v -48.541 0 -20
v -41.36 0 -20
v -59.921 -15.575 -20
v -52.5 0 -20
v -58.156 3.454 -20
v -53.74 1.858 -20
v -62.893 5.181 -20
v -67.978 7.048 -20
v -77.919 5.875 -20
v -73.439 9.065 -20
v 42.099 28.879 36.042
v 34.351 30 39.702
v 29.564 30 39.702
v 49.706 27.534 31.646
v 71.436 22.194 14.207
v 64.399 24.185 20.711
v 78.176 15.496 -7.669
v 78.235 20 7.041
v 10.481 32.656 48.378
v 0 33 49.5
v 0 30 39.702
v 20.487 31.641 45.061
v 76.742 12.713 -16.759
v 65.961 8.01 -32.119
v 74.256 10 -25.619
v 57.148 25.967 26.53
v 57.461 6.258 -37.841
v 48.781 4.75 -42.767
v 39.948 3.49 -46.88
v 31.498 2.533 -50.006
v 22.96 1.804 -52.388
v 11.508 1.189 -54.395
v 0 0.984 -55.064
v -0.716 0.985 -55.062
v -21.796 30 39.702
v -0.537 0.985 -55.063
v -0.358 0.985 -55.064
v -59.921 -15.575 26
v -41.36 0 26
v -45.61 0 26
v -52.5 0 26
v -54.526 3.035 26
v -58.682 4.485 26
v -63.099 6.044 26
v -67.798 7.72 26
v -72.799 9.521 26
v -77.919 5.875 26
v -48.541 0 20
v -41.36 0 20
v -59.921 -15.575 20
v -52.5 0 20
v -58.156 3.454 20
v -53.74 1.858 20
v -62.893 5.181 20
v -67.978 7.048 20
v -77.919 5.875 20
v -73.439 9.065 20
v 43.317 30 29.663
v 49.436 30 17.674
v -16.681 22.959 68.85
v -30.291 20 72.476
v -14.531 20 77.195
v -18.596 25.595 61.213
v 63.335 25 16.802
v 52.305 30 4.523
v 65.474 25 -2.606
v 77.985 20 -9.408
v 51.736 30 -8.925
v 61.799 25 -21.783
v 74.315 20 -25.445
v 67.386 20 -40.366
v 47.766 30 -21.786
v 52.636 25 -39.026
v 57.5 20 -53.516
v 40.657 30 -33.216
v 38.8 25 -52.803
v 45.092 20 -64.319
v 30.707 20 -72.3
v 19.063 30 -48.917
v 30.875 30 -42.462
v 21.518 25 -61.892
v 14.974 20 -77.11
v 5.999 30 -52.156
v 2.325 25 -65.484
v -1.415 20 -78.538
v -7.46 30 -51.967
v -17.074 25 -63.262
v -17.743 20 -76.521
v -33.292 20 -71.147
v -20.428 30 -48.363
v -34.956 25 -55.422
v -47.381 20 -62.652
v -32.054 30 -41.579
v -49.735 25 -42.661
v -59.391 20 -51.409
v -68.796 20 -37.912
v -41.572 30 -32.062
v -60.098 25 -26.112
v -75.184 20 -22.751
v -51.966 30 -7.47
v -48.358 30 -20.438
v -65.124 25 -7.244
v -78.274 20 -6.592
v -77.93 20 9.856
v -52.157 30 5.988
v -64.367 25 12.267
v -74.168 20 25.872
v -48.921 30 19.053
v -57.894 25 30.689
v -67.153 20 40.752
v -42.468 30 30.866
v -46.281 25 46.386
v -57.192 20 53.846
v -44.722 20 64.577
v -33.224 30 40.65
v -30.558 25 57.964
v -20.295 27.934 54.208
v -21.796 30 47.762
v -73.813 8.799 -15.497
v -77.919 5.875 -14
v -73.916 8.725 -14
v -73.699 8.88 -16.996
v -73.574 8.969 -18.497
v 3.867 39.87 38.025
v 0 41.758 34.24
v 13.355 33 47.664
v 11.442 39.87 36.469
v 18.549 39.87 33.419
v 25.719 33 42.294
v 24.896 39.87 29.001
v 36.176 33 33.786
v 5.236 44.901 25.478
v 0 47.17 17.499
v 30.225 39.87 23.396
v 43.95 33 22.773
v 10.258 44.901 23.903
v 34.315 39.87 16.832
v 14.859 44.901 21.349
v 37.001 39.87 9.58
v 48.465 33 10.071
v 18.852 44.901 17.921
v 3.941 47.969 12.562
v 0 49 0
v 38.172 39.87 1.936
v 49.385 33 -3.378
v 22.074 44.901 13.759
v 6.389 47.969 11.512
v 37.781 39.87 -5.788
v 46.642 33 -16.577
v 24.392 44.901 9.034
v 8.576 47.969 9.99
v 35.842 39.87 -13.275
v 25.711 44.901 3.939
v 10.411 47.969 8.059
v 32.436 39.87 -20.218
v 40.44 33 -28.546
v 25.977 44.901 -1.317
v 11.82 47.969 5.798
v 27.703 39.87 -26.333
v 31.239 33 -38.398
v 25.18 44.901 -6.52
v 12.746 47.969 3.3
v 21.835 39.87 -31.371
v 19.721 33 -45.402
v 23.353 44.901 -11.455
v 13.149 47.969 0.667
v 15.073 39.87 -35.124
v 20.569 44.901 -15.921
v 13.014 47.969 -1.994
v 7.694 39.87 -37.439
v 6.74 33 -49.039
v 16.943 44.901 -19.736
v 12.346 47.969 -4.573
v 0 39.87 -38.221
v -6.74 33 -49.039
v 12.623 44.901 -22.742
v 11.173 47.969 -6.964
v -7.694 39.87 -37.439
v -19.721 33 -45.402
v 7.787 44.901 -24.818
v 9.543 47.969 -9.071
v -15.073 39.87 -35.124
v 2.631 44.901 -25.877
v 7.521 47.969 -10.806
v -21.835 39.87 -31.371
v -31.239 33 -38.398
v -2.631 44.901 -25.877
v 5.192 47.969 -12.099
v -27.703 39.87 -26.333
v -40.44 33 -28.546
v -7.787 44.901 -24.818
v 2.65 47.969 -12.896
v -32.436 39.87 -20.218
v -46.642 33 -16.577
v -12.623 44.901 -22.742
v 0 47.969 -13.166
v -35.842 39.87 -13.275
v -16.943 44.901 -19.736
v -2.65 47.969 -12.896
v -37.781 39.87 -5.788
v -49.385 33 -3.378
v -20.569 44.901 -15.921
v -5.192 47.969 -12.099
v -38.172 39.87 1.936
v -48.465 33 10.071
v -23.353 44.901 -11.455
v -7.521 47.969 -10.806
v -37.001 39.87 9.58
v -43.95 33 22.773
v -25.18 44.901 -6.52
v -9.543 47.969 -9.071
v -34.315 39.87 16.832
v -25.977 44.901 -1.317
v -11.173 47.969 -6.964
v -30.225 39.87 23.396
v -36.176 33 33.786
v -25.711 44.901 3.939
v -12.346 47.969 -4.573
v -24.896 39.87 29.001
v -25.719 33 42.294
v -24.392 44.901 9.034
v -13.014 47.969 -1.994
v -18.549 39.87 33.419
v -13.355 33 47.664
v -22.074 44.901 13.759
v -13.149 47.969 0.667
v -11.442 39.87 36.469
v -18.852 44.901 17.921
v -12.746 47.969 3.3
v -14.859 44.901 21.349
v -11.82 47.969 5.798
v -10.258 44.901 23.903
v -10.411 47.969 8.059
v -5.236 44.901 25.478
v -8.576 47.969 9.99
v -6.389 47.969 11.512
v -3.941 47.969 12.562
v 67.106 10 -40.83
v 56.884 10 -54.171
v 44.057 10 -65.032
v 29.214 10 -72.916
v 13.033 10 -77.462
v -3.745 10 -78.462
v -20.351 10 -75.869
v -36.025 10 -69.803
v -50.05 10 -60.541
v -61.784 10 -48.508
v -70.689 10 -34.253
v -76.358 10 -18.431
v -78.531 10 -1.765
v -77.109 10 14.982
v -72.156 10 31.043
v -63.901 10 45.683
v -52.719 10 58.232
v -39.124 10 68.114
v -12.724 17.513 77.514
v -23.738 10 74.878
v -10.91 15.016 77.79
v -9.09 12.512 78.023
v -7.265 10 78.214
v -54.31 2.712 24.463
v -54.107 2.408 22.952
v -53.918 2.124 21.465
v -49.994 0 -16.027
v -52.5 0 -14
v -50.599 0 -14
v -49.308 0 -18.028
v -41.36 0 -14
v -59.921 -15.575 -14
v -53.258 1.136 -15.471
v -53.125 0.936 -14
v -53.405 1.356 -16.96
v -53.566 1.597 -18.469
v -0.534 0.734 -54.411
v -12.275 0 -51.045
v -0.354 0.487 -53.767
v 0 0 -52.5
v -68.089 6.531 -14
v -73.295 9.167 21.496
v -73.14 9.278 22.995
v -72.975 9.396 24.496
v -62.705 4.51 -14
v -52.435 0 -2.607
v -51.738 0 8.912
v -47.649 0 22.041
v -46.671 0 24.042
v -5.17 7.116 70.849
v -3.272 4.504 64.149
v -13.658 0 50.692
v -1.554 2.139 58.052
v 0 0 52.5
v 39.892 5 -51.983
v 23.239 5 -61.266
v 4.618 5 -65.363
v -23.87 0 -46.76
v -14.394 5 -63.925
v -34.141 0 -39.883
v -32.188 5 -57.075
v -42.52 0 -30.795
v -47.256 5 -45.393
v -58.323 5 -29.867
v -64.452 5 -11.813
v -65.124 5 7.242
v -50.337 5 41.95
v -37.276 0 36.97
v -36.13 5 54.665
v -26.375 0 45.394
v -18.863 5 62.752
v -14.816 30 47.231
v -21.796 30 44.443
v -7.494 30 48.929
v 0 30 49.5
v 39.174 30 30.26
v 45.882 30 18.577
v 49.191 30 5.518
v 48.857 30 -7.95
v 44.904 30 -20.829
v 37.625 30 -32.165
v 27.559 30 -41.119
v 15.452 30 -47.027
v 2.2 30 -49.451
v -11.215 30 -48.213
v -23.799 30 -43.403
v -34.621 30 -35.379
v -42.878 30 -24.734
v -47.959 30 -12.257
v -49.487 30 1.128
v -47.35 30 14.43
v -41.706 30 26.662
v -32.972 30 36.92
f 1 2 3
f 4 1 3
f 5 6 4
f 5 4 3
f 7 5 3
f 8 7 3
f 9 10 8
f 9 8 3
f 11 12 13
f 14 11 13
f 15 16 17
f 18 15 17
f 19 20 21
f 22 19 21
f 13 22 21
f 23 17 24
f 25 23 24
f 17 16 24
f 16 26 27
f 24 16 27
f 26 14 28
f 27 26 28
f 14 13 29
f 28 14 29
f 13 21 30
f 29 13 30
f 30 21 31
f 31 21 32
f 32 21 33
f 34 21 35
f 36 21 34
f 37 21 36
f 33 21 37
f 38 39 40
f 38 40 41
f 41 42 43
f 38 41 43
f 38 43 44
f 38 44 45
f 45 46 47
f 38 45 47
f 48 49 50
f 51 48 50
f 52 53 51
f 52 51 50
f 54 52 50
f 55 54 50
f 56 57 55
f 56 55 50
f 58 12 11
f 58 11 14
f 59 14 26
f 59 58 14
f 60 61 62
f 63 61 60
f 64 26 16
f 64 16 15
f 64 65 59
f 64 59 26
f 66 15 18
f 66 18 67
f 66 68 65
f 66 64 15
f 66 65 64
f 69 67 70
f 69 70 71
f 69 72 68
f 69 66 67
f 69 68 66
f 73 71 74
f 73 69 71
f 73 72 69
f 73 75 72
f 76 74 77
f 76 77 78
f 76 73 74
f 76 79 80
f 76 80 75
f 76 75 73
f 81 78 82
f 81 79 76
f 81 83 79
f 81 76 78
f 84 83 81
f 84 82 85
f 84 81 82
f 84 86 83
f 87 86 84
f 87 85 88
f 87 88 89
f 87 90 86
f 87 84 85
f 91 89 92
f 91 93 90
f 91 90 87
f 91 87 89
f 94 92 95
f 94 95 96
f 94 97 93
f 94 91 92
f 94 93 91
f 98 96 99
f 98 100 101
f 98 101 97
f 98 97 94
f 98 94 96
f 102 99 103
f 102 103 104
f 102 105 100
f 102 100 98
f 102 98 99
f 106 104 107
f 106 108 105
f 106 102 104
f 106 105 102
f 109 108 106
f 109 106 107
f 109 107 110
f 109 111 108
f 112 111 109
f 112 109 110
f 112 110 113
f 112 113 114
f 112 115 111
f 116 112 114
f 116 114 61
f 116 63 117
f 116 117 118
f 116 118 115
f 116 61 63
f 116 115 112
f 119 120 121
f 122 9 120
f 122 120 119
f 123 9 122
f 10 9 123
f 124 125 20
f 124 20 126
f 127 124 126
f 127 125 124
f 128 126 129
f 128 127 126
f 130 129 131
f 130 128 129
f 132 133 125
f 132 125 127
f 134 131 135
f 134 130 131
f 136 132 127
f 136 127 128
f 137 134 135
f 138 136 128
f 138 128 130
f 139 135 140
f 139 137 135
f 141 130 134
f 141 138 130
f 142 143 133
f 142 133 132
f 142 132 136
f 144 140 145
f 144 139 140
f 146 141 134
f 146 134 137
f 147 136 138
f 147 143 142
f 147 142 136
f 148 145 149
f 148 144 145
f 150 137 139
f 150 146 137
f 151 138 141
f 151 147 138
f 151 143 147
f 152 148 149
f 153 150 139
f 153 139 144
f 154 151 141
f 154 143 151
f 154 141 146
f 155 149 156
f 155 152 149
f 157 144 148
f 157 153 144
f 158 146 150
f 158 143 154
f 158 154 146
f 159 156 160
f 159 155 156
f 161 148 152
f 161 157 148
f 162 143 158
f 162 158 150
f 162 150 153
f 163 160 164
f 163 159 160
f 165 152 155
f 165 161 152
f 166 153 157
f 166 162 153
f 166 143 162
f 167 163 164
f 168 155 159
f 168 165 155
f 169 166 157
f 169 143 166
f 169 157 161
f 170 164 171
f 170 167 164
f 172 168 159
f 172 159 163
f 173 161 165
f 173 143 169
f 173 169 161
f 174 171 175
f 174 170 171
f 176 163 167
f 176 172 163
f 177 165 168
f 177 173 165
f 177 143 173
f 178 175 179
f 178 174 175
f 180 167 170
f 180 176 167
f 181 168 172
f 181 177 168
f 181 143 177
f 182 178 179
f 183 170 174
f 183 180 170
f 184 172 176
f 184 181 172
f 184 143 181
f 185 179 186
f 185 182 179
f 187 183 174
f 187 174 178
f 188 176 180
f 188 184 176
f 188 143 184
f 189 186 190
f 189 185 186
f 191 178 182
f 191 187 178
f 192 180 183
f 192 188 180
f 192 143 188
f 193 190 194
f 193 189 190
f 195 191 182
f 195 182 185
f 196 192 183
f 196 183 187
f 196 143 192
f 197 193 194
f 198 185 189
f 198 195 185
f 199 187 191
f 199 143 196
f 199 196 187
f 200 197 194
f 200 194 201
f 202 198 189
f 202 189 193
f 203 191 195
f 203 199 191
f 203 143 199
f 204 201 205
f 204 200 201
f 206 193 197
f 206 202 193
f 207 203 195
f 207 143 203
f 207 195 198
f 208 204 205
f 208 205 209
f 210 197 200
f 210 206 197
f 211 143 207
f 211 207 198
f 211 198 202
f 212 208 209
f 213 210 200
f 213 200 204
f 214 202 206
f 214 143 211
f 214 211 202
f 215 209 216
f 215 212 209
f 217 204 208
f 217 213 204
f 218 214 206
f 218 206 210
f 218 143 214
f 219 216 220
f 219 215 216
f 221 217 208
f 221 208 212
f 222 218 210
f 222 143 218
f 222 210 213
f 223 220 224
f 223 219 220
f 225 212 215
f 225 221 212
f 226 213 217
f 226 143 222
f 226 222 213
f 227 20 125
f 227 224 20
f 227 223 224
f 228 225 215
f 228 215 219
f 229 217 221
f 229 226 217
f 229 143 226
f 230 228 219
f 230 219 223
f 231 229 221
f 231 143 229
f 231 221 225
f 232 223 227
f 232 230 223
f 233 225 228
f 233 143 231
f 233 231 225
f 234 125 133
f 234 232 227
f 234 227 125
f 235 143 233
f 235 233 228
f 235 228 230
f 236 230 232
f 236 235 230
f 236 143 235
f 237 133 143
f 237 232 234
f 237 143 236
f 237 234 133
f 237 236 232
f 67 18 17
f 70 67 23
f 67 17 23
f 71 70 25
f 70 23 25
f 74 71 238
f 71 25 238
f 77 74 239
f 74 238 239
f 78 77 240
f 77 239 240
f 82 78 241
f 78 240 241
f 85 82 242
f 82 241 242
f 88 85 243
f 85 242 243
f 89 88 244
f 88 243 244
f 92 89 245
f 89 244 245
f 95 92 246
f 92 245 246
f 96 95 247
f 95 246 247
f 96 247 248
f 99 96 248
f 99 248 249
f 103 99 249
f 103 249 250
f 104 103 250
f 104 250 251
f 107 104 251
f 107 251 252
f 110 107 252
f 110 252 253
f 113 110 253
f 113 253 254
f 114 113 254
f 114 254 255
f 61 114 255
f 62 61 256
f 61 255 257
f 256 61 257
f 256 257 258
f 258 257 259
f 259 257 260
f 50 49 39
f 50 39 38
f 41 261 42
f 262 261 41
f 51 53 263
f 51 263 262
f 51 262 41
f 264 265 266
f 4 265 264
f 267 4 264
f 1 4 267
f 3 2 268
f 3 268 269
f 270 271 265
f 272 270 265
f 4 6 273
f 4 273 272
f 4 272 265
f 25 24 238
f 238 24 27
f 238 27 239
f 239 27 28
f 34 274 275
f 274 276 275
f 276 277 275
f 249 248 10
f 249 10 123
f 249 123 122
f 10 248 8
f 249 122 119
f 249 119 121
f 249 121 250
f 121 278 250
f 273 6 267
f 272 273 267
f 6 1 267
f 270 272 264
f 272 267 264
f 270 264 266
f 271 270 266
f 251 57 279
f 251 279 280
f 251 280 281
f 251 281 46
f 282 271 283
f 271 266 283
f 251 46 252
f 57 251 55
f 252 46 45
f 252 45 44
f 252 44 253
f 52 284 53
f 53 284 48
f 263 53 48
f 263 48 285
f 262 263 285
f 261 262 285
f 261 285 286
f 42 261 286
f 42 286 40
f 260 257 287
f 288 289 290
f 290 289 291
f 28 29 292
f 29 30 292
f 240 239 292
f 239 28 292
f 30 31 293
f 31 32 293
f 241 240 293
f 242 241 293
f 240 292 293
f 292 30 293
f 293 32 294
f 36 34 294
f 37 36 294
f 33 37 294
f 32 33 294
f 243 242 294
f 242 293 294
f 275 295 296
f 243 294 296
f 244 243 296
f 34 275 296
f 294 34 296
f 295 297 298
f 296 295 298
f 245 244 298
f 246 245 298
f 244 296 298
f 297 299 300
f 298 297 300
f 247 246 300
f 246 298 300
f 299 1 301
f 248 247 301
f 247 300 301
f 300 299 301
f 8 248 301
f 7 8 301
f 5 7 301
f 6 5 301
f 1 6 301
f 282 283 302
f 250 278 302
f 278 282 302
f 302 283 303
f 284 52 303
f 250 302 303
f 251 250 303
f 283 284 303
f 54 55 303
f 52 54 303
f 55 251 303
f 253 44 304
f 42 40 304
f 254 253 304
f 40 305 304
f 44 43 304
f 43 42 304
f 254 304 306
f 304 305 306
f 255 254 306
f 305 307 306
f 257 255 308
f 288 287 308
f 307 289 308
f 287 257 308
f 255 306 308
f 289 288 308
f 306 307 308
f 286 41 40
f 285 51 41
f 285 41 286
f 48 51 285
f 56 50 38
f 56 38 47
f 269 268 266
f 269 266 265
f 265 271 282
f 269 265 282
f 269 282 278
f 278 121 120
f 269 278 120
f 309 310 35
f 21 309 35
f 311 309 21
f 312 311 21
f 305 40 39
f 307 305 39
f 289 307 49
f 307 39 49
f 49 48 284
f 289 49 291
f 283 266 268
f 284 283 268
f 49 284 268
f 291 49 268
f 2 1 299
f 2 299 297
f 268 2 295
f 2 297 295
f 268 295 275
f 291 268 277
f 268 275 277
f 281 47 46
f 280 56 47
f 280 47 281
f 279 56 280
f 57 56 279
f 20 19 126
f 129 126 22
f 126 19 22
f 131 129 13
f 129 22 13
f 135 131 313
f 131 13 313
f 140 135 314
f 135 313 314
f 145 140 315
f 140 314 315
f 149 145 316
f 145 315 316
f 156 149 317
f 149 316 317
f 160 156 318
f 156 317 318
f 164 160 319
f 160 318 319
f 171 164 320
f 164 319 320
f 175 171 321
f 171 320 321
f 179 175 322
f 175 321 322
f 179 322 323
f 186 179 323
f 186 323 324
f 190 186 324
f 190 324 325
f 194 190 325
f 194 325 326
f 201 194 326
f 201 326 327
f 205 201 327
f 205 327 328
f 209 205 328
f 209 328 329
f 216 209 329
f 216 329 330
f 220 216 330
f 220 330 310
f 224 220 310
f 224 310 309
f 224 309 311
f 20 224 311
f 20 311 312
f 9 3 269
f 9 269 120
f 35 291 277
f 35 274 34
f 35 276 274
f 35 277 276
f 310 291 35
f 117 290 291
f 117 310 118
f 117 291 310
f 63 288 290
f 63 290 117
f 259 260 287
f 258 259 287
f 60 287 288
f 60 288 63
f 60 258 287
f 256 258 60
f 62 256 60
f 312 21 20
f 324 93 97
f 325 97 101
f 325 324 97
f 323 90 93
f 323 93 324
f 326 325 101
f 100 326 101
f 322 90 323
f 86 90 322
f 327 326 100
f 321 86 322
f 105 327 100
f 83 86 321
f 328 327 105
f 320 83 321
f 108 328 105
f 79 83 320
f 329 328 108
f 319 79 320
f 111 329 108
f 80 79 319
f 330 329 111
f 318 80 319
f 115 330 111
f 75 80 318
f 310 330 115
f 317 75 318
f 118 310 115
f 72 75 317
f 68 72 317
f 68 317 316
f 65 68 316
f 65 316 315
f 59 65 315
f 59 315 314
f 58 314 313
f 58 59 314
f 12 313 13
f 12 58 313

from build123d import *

# Parameters (mm, degrees)
CROQUIS1_R              = 52.5
SALIENTE_EXTRUIR1_DEPTH = 10
SALIENTE_EXTRUIR1_DRAFT = -69
CROQUIS2_R              = 78.550890647
SALIENTE_EXTRUIR2_DEPTH = 10
CROQUIS3_R              = 78.550890647
SALIENTE_EXTRUIR3_DEPTH = 10
SALIENTE_EXTRUIR3_TAPER = 69
CROQUIS4_R              = 49.5
SALIENTE_EXTRUIR4_DEPTH = 3
C_PULA1_FACE_RADIUS     = 49.5
C_PULA1_HEIGHT          = 16
CORTAR_EXTRUIR1_DEPTH   = 122.414516736
CORTAR_EXTRUIR3_REACH   = 184.352
SALIENTE_EXTRUIR5_DEPTH = 6
MATRIZL1_COUNT          = 2
MATRIZL1_PITCH          = 40


with BuildPart() as part:
    # Croquis1 → Saliente-Extruir1 (with draft: the straight prism first)
    with BuildSketch(Plane(origin=(0, 0, 0), x_dir=(1, 0, 0), z_dir=(0, 1, 0))):
        Circle(CROQUIS1_R)
    extrude(amount=SALIENTE_EXTRUIR1_DEPTH)
    # Saliente-Extruir1: the draft: its side faces are tilted about the plane it starts from
    saliente_extruir1_sides = [part.faces().sort_by_distance(p)[0] for p in [
        (-52.5, 5, 0),
    ]]
    draft(saliente_extruir1_sides, Plane(origin=(0, 0, 0), x_dir=(1, 0, 0), z_dir=(0, 1, 0)), SALIENTE_EXTRUIR1_DRAFT)

    # Croquis2 → Saliente-Extruir2 (add)
    with BuildSketch(Plane(origin=(0, 10, 0), x_dir=(1, 0, 0), z_dir=(0, 1, 0))):
        with Locations(Location((0, 0, 0), (0, 0, 270))):
            Circle(CROQUIS2_R)
    extrude(amount=SALIENTE_EXTRUIR2_DEPTH)

    # Croquis3 → Saliente-Extruir3 (add)
    with BuildSketch(Plane(origin=(0, 20, 0), x_dir=(1, 0, 0), z_dir=(0, 1, 0))):
        with Locations(Location((0, 0, 0), (0, 0, 270))):
            Circle(CROQUIS3_R)
    extrude(amount=SALIENTE_EXTRUIR3_DEPTH, taper=SALIENTE_EXTRUIR3_TAPER)

    # Croquis4 → Saliente-Extruir4 (add)
    with BuildSketch(Plane(origin=(0, 30, 0), x_dir=(1, 0, 0), z_dir=(0, 1, 0))):
        with Locations(Location((0, 0, 0), (0, 0, 270))):
            Circle(CROQUIS4_R)
    extrude(amount=SALIENTE_EXTRUIR4_DEPTH)

    # Cúpula1: a dome of height H over a round flat face of radius A is a cap of a sphere of radius (A * A + H * H) / (2 * H)
    c_pula1_r = (C_PULA1_FACE_RADIUS * C_PULA1_FACE_RADIUS + C_PULA1_HEIGHT * C_PULA1_HEIGHT) / (2 * C_PULA1_HEIGHT)
    c_pula1_base = Plane((0, 33, 0), z_dir=(0, 1, 0))
    with Locations(c_pula1_base.offset(C_PULA1_HEIGHT - c_pula1_r)):
        c_pula1_ball = Sphere(c_pula1_r, mode=Mode.PRIVATE)
    add(split(c_pula1_ball, bisect_by=c_pula1_base, keep=Keep.TOP, mode=Mode.PRIVATE))

    # Croquis6 → Cortar-Extruir1 (cut, through all)
    with BuildSketch(Plane(origin=(0, 0, 0), x_dir=(0, 0, -1), z_dir=(1, 0, 0))):
        Polygon((-49.5, 33), (55.064393683, 0.984378507), (52.5, 0), (-52.5, 0), (-78.550890647, 10), (-78.550890647, 20), align=None)
    extrude(amount=CORTAR_EXTRUIR1_DEPTH, mode=Mode.SUBTRACT)

    # Cortar-Extruir3: up to this plane
    cortar_extruir3_end = Plane(origin=(78.550890647, 33, 49.5), z_dir=(0, -0.9561843075173418, 0.2927653839810668))
    # Croquis9 → Cortar-Extruir3 (cut, up to the surface)
    with BuildSketch(Plane.XY.offset(78.550890647), mode=Mode.PRIVATE) as cortar_extruir3_sk1:
        Polygon((0, 0), (-21.79627584, 30), (0, 30), align=None)
    cortar_extruir3_tool1 = split(extrude(cortar_extruir3_sk1.sketch, amount=-CORTAR_EXTRUIR3_REACH, mode=Mode.PRIVATE), bisect_by=cortar_extruir3_end, keep=Keep.BOTH, mode=Mode.PRIVATE)
    add(cortar_extruir3_tool1.solids().sort_by_distance((-7.265425, 20, 78.550891))[0], mode=Mode.SUBTRACT)

    # Croquis11 → Saliente-Extruir5 (add)
    with BuildSketch(Plane.XY.offset(20)):
        Polygon((-63.346461172, 16.251599406), (-52.5, 0), (-41.36, 0), (-59.921256857, -15.574743783), (-77.919309928, 5.874500625), align=None)
    saliente_extruir5 = extrude(amount=SALIENTE_EXTRUIR5_DEPTH)

    # MatrizL1: Saliente-Extruir5 ×2
    with Locations(*[(0, 0, -i * MATRIZL1_PITCH) for i in range(1, MATRIZL1_COUNT)]):
        add(saliente_extruir5)


solid = part.part
